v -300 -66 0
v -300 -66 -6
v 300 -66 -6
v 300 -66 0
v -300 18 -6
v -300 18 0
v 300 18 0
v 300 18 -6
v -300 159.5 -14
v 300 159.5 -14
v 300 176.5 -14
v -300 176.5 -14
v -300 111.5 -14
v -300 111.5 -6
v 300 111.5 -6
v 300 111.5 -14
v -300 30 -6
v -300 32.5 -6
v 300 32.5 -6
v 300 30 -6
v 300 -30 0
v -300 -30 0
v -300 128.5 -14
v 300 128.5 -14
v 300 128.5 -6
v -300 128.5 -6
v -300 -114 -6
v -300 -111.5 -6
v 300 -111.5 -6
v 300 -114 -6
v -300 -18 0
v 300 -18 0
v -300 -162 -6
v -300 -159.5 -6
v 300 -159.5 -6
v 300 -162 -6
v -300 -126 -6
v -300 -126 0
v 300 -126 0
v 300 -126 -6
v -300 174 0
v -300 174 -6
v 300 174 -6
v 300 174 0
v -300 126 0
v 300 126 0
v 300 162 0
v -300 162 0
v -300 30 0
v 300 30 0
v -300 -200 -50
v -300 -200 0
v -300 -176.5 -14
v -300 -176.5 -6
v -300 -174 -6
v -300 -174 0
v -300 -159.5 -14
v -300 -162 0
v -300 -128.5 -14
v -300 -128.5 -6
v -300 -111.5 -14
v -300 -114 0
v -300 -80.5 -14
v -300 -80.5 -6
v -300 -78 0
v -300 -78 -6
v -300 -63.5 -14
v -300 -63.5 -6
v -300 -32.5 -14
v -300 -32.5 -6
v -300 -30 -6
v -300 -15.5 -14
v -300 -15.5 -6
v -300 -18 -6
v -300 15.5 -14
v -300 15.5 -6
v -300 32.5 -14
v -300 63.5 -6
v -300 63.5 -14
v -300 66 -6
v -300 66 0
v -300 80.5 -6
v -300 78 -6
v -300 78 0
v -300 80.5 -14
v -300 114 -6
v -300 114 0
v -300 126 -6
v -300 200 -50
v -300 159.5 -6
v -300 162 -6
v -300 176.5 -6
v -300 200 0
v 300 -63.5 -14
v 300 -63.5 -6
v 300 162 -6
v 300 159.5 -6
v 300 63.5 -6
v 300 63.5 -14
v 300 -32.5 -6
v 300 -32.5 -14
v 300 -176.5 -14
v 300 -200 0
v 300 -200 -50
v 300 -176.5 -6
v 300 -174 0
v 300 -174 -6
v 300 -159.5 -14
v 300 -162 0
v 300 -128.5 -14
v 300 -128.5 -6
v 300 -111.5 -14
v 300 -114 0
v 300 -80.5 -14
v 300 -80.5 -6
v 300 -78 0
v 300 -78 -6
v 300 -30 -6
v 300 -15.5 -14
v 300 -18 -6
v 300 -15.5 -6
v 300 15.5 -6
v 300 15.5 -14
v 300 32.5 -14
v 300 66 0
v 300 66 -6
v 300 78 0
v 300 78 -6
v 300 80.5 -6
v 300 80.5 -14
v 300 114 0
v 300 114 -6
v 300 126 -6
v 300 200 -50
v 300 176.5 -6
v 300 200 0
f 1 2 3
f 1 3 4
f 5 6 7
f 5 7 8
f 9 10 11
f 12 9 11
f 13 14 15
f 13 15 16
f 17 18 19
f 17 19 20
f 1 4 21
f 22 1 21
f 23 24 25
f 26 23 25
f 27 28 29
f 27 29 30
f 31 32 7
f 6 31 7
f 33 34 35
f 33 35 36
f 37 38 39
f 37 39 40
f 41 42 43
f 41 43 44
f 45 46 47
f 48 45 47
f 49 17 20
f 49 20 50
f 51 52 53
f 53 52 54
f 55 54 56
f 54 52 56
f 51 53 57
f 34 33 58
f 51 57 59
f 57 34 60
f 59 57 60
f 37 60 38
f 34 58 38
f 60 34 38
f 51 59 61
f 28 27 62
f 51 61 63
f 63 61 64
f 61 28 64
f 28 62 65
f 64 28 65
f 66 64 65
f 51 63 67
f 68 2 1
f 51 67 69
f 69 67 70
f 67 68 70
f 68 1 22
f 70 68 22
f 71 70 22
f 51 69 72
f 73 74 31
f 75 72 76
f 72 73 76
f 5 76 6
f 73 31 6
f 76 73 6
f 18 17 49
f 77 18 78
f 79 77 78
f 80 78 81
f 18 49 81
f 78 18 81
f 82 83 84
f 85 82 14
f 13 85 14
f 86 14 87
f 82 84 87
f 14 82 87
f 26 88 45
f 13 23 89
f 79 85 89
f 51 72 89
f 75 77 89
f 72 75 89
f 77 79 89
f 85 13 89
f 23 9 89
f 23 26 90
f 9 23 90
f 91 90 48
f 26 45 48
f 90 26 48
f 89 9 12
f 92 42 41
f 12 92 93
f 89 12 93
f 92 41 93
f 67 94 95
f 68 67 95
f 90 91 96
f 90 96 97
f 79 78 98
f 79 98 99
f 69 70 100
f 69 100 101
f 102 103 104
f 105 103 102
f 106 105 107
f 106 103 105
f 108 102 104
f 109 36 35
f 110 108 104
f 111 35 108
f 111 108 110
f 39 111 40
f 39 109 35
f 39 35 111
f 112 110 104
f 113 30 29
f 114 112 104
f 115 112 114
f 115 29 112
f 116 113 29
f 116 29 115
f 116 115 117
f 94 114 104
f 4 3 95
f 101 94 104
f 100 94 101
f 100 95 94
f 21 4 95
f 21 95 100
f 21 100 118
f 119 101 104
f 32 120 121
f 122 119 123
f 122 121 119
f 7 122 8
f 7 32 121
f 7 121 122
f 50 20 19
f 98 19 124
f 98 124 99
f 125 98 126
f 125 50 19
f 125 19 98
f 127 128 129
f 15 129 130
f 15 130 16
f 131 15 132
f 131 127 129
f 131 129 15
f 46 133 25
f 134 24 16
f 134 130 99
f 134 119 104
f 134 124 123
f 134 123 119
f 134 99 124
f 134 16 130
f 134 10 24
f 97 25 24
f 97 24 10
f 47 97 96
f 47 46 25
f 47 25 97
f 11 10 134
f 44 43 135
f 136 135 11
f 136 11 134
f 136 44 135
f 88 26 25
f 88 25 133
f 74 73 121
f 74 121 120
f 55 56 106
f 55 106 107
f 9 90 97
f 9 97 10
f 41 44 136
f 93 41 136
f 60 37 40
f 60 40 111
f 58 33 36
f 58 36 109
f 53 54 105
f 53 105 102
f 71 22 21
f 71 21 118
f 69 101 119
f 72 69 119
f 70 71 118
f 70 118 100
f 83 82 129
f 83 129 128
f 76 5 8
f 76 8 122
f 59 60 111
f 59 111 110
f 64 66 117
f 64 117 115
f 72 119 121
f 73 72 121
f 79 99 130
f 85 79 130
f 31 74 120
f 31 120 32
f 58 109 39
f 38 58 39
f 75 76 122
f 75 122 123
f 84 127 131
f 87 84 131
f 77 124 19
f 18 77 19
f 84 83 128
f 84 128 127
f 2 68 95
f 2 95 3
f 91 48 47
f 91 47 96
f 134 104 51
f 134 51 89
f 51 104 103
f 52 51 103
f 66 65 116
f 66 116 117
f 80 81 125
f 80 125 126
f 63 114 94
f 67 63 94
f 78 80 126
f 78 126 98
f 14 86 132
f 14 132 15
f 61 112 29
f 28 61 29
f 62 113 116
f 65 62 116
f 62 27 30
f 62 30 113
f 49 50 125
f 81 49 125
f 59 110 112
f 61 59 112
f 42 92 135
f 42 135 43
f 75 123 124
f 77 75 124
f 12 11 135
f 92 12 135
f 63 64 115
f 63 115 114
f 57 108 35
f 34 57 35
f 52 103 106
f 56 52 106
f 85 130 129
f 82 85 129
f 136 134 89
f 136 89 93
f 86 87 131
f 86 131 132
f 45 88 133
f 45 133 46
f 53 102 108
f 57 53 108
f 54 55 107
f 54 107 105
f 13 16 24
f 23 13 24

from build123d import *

# Parameters (mm, degrees)
F0_W     = 400
F0_H     = 50
F1_DEPTH = 300
F3_DEPTH = 600.001


with BuildPart() as f1:
    # F0 (on Right) → F1 (new body, symmetric)
    with BuildSketch(Plane.YZ):
        with Locations((0, -25)):
            Rectangle(F0_W, F0_H)
    extrude(amount=F1_DEPTH, both=True)

    # F2 (on face) → F3 (cut, through all)
    with BuildSketch(Plane.YZ.offset(300)):
        Polygon((-162, 0), (-174, 0), (-174, -6), (-176.5, -6), (-176.5, -14), (-159.5, -14), (-159.5, -6), (-162, -6), align=None)
        Polygon((-128.5, -6), (-128.5, -14), (-111.5, -14), (-111.5, -6), (-114, -6), (-114, 0), (-126, 0), (-126, -6), align=None)
        Polygon((-80.5, -6), (-80.5, -14), (-63.5, -14), (-63.5, -6), (-66, -6), (-66, 0), (-78, 0), (-78, -6), align=None)
        Polygon((-32.5, -6), (-32.5, -14), (-15.5, -14), (-15.5, -6), (-18, -6), (-18, 0), (-30, 0), (-30, -6), align=None)
        Polygon((15.5, -6), (15.5, -14), (32.5, -14), (32.5, -6), (30, -6), (30, 0), (18, 0), (18, -6), align=None)
        Polygon((63.5, -6), (63.5, -14), (80.5, -14), (80.5, -6), (78, -6), (78, 0), (66, 0), (66, -6), align=None)
        Polygon((111.5, -6), (111.5, -14), (128.5, -14), (128.5, -6), (126, -6), (126, 0), (114, 0), (114, -6), align=None)
        Polygon((159.5, -6), (159.5, -14), (176.5, -14), (176.5, -6), (174, -6), (174, 0), (162, 0), (162, -6), align=None)
    extrude(amount=-F3_DEPTH, mode=Mode.SUBTRACT)


solid = f1.part
